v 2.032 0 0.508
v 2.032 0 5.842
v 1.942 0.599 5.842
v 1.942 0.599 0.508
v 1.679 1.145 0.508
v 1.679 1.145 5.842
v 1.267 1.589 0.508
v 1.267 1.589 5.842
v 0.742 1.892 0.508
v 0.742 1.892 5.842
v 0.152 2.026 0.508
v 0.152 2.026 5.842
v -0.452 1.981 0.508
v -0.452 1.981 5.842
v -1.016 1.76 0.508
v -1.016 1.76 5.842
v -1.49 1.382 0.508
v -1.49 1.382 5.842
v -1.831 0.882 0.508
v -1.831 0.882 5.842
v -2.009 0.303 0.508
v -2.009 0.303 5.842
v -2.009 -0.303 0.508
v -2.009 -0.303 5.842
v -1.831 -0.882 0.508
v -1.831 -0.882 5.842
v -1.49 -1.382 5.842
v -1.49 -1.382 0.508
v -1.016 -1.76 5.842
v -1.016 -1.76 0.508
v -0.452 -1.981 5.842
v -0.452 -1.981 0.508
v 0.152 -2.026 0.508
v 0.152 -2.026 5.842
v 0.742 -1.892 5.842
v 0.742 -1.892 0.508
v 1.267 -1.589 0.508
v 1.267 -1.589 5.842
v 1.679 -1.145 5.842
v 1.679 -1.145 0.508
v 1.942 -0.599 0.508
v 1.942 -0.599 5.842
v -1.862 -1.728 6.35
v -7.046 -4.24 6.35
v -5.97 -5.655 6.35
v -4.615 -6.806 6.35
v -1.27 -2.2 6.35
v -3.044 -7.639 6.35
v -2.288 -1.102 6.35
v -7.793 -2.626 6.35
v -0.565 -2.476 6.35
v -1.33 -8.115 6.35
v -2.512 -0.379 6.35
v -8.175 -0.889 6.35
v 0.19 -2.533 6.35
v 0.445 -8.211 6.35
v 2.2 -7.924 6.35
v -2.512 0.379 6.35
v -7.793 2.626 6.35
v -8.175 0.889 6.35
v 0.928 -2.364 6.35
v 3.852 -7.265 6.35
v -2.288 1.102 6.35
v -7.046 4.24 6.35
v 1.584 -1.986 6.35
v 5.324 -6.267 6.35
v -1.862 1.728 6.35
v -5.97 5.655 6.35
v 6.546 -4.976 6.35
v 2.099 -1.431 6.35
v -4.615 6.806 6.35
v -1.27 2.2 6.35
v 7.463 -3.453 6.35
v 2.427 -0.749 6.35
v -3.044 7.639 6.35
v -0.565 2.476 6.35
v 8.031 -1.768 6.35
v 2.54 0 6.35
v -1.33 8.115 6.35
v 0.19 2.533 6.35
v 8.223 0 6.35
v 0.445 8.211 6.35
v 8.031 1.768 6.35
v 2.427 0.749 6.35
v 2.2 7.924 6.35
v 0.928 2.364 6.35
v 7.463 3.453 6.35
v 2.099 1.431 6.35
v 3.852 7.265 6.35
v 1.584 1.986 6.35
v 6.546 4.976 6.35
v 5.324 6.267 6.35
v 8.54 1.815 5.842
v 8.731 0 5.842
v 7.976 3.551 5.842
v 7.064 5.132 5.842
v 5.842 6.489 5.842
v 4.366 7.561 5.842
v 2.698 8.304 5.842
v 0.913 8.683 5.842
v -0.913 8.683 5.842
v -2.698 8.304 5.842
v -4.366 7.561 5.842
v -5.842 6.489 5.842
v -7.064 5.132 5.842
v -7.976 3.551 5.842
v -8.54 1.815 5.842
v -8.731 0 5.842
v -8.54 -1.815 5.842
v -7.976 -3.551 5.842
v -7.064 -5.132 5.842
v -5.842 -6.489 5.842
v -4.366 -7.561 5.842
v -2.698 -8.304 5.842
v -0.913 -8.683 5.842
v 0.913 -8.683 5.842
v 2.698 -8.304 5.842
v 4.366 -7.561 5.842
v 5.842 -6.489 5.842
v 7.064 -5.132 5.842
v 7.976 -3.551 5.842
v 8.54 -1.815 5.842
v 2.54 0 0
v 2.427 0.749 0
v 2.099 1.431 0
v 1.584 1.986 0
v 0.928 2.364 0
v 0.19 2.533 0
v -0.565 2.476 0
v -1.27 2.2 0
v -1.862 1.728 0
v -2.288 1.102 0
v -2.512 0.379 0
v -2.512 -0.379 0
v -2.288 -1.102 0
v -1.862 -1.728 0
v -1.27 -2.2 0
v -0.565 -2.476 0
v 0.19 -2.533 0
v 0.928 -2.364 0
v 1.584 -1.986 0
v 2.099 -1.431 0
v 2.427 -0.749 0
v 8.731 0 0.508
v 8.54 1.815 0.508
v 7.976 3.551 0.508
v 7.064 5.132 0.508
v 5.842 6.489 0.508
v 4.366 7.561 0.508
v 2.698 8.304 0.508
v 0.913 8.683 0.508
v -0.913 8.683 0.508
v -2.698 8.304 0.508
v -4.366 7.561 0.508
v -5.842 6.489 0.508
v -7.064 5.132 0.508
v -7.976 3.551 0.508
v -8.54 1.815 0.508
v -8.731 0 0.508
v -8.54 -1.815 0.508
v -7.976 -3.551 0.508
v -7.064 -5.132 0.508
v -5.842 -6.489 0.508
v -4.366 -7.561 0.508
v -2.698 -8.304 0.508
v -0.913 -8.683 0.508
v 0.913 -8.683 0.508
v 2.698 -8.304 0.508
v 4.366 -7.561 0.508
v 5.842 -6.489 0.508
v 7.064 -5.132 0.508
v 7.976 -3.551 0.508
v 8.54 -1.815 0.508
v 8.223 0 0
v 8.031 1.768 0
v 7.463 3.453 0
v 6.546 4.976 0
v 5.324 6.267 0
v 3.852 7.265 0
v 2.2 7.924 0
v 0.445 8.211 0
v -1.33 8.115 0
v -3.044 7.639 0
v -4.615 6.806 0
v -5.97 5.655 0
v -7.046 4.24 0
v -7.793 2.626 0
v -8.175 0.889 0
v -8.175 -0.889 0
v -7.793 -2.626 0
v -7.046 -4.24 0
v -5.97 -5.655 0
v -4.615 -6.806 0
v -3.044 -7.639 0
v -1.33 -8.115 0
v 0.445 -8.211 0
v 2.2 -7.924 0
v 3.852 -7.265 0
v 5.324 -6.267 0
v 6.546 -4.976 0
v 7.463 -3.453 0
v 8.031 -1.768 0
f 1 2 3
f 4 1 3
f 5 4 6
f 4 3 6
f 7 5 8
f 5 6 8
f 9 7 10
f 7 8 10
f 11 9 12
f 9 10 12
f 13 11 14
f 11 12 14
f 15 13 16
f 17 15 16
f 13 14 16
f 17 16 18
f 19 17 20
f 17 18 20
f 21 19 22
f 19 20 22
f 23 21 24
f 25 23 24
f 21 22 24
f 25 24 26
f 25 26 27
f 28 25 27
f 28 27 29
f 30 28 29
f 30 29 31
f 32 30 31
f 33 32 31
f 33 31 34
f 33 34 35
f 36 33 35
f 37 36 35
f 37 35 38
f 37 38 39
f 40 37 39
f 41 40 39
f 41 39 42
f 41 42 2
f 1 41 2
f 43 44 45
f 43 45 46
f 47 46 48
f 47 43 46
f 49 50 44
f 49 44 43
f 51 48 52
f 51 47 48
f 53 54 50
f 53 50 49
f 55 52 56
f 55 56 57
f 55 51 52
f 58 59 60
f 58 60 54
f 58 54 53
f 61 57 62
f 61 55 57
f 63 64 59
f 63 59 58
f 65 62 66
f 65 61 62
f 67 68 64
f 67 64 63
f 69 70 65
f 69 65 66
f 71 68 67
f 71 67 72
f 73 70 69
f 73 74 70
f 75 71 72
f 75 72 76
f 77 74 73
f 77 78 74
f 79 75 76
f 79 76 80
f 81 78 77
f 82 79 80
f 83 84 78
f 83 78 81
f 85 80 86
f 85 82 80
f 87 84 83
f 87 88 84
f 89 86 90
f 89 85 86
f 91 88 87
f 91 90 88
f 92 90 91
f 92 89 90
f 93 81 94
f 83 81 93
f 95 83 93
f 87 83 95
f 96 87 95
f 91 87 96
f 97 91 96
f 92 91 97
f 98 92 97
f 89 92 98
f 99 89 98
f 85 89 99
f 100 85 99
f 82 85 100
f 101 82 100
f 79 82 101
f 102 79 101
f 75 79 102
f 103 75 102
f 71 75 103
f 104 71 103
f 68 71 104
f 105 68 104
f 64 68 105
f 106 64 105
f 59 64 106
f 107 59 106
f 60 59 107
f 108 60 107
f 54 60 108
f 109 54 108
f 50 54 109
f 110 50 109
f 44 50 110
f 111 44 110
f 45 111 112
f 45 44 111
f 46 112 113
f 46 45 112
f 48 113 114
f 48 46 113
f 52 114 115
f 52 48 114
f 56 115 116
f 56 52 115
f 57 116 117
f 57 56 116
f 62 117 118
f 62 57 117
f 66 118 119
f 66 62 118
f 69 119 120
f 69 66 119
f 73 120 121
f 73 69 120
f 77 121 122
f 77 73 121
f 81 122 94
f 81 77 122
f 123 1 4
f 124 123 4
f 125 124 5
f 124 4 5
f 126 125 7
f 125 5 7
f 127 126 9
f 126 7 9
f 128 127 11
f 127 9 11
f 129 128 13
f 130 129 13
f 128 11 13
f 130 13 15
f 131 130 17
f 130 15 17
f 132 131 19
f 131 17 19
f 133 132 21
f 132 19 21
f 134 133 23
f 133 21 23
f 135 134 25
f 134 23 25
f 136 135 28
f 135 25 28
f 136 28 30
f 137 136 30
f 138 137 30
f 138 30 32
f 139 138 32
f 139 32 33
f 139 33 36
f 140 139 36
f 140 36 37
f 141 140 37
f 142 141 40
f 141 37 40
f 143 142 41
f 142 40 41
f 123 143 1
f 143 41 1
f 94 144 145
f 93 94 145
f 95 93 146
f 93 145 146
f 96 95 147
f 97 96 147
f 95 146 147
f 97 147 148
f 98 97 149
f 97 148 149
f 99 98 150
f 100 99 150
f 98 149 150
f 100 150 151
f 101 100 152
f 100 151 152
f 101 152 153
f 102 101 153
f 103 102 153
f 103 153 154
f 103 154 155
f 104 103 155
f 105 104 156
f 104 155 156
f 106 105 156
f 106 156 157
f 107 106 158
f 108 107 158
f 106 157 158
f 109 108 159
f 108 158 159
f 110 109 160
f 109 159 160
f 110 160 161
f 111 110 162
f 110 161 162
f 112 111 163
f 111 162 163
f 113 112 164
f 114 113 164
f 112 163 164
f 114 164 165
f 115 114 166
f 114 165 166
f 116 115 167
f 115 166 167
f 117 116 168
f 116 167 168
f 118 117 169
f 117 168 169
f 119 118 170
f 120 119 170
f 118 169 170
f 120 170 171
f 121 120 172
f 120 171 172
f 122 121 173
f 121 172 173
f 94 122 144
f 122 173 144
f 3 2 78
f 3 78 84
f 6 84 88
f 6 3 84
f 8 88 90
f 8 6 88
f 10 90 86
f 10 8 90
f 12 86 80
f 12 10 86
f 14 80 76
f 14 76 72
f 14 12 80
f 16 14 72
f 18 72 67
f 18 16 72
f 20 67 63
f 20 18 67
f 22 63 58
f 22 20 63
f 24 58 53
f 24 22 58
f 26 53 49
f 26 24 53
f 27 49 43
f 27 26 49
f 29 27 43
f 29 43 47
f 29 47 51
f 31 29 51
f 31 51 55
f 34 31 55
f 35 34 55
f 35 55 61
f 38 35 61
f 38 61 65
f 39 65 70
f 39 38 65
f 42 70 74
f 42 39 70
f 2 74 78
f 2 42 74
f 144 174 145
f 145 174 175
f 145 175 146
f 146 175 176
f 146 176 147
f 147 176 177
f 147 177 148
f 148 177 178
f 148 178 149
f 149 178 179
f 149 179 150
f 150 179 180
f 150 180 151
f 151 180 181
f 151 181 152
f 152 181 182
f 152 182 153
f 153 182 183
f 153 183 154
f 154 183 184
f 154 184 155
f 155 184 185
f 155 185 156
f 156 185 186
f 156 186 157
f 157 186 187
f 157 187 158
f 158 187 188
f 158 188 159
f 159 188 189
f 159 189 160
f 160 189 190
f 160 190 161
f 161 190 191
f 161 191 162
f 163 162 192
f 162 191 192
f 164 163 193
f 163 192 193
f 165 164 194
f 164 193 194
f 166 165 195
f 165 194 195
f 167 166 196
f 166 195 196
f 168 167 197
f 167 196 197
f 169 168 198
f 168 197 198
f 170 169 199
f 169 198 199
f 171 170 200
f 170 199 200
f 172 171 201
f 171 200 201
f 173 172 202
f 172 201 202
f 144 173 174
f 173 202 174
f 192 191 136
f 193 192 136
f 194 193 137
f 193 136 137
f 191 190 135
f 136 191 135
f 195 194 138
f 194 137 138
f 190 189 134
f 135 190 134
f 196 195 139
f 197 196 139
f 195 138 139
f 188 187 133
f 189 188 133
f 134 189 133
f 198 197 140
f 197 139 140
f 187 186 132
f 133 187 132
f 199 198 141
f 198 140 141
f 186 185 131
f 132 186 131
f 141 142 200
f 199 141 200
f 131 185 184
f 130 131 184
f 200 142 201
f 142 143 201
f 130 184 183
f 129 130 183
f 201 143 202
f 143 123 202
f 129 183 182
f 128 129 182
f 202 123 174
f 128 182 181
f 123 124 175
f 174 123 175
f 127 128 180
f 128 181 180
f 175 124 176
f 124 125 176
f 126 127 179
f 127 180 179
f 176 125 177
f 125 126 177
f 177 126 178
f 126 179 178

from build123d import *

# Parameters (mm, degrees)
F0_R     = 8.73125
F1_DEPTH = 6.35
F2_R     = 2.032
F3_DEPTH = 25.4
F4_SIZE  = 0.508


with BuildPart() as f1:
    # F0 (on Top) → F1 (new body)
    with BuildSketch(Plane.XY):
        Circle(F0_R)
    extrude(amount=F1_DEPTH)

    # F2 (on face) → F3 (cut)
    with BuildSketch(Plane.XY.offset(6.35)):
        Circle(F2_R)
    extrude(amount=-F3_DEPTH, mode=Mode.SUBTRACT)

    # F4
    f4_edges = [f1.edges().sort_by_distance(p)[0] for p in [
        (-8.73125, 0, 0),
        (-8.73125, 0, 6.35),
        (-2.032, 0, 6.35),
        (-2.032, 0, 0),
    ]]
    chamfer(f4_edges, length=F4_SIZE)


solid = f1.part
